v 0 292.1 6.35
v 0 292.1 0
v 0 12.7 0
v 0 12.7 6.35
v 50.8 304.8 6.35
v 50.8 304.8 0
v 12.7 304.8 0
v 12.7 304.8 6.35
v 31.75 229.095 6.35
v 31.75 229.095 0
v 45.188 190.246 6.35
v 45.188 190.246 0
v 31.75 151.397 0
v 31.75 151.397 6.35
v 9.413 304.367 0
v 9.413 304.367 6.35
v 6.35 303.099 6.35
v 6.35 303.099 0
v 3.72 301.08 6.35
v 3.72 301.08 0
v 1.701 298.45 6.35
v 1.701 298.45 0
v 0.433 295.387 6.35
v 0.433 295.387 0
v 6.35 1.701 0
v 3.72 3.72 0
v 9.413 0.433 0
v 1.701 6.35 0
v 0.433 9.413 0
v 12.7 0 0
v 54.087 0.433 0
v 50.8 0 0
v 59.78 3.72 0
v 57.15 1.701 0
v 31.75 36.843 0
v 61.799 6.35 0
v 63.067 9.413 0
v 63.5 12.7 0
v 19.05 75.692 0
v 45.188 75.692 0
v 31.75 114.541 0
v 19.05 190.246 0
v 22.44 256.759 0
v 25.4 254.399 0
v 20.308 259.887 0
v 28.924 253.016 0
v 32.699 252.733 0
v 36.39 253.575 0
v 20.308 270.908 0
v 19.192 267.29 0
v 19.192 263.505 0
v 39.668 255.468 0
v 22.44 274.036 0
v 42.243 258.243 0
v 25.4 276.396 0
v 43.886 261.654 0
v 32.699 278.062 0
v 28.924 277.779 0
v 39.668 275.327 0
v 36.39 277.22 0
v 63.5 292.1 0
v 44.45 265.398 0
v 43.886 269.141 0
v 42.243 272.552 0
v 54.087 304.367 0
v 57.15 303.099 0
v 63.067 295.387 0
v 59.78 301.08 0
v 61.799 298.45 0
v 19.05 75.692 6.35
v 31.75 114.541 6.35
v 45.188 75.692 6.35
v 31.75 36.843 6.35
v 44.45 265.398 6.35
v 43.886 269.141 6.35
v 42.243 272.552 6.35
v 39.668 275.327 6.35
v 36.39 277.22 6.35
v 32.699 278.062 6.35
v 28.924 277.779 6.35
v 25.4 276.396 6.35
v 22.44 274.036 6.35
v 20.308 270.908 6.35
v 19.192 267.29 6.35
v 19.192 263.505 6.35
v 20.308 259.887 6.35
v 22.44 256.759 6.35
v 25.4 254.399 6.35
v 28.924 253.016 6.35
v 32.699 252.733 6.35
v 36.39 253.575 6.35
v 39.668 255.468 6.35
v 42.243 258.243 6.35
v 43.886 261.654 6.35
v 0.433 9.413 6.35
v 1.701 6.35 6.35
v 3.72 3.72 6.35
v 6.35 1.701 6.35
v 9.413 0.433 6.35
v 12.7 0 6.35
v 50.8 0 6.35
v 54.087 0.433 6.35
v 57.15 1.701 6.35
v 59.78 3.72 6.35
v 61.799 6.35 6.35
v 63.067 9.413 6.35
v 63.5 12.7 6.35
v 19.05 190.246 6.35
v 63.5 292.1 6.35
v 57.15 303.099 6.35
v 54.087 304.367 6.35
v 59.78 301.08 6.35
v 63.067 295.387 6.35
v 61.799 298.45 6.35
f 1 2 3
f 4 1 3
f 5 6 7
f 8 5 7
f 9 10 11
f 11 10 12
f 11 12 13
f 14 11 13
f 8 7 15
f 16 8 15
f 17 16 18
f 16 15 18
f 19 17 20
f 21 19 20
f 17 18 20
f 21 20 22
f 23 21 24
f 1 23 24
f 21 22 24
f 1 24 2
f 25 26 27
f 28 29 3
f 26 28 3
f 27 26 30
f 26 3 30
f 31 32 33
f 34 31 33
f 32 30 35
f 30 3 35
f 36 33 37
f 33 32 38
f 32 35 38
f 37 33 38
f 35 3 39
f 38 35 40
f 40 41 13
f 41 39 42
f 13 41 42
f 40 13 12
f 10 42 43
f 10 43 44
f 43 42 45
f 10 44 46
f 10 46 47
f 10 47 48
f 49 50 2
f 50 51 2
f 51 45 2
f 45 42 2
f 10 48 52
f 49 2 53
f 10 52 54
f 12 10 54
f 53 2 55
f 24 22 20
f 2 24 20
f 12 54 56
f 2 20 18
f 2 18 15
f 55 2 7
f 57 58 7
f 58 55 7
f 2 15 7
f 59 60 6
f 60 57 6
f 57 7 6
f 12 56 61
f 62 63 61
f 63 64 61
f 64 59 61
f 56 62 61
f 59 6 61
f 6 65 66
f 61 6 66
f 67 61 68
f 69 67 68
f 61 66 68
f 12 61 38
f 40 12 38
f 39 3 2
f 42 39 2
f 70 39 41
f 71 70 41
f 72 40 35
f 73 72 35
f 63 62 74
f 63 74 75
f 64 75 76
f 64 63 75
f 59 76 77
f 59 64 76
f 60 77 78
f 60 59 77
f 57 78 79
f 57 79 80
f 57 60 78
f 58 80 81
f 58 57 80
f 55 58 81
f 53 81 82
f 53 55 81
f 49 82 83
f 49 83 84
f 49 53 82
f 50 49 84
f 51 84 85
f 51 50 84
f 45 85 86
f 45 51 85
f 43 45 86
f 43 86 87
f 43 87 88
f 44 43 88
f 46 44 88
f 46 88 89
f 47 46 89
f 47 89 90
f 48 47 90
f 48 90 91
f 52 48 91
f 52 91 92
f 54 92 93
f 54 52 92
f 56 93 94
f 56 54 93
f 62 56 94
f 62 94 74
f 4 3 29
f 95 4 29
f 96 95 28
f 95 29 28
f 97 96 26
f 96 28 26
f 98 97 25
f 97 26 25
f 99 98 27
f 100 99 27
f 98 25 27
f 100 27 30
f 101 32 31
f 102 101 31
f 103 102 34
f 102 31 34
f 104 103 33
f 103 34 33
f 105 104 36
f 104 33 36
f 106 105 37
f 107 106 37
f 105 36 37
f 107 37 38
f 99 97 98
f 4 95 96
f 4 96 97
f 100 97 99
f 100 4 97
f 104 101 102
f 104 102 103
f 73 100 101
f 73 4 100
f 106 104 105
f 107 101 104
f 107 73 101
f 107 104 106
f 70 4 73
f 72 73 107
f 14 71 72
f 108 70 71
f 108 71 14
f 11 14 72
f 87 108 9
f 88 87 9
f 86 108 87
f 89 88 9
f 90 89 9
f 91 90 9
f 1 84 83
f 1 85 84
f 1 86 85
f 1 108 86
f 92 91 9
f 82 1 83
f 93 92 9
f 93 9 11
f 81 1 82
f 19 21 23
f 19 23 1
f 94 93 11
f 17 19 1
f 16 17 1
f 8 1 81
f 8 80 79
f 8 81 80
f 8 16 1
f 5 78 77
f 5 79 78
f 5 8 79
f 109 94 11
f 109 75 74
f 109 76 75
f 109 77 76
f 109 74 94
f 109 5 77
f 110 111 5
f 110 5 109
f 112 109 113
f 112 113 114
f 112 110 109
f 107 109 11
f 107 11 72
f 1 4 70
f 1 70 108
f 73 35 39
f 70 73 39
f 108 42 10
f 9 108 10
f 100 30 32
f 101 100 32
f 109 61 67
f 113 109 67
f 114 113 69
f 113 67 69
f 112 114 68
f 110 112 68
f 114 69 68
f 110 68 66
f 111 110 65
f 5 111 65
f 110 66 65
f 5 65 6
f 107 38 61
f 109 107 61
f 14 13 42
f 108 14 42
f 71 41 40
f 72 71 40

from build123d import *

# Parameters (mm, degrees)
F0_R     = 12.7
F1_DEPTH = 6.35


with BuildPart() as f1:
    # F0 (on Top) → F1 (new body)
    with BuildSketch(Plane.XY):
        with BuildLine():
            ThreePointArc((0, 12.7), (3.719744, 3.719744), (12.7, 0))
            Line((12.7, 0), (50.8, 0))
            ThreePointArc((50.8, 0), (59.780256, 3.719744), (63.5, 12.7))
            Line((63.5, 12.7), (63.5, 292.1))
            ThreePointArc((63.5, 292.1), (59.780256, 301.080256), (50.8, 304.8))
            Line((50.8, 304.8), (12.7, 304.8))
            ThreePointArc((12.7, 304.8), (3.719744, 301.080256), (0, 292.1))
            Line((0, 292.1), (0, 12.7))
        make_face()
        Polygon((19.05, 75.692), (31.75, 114.540583), (45.188366, 75.692), (31.75, 36.843417), align=None, mode=Mode.SUBTRACT)
        Polygon((19.05, 190.246), (31.75, 229.094583), (45.188366, 190.246), (31.75, 151.397417), align=None, mode=Mode.SUBTRACT)
        with Locations((31.75, 265.397549)):
            Circle(F0_R, mode=Mode.SUBTRACT)
    extrude(amount=F1_DEPTH)


solid = f1.part
